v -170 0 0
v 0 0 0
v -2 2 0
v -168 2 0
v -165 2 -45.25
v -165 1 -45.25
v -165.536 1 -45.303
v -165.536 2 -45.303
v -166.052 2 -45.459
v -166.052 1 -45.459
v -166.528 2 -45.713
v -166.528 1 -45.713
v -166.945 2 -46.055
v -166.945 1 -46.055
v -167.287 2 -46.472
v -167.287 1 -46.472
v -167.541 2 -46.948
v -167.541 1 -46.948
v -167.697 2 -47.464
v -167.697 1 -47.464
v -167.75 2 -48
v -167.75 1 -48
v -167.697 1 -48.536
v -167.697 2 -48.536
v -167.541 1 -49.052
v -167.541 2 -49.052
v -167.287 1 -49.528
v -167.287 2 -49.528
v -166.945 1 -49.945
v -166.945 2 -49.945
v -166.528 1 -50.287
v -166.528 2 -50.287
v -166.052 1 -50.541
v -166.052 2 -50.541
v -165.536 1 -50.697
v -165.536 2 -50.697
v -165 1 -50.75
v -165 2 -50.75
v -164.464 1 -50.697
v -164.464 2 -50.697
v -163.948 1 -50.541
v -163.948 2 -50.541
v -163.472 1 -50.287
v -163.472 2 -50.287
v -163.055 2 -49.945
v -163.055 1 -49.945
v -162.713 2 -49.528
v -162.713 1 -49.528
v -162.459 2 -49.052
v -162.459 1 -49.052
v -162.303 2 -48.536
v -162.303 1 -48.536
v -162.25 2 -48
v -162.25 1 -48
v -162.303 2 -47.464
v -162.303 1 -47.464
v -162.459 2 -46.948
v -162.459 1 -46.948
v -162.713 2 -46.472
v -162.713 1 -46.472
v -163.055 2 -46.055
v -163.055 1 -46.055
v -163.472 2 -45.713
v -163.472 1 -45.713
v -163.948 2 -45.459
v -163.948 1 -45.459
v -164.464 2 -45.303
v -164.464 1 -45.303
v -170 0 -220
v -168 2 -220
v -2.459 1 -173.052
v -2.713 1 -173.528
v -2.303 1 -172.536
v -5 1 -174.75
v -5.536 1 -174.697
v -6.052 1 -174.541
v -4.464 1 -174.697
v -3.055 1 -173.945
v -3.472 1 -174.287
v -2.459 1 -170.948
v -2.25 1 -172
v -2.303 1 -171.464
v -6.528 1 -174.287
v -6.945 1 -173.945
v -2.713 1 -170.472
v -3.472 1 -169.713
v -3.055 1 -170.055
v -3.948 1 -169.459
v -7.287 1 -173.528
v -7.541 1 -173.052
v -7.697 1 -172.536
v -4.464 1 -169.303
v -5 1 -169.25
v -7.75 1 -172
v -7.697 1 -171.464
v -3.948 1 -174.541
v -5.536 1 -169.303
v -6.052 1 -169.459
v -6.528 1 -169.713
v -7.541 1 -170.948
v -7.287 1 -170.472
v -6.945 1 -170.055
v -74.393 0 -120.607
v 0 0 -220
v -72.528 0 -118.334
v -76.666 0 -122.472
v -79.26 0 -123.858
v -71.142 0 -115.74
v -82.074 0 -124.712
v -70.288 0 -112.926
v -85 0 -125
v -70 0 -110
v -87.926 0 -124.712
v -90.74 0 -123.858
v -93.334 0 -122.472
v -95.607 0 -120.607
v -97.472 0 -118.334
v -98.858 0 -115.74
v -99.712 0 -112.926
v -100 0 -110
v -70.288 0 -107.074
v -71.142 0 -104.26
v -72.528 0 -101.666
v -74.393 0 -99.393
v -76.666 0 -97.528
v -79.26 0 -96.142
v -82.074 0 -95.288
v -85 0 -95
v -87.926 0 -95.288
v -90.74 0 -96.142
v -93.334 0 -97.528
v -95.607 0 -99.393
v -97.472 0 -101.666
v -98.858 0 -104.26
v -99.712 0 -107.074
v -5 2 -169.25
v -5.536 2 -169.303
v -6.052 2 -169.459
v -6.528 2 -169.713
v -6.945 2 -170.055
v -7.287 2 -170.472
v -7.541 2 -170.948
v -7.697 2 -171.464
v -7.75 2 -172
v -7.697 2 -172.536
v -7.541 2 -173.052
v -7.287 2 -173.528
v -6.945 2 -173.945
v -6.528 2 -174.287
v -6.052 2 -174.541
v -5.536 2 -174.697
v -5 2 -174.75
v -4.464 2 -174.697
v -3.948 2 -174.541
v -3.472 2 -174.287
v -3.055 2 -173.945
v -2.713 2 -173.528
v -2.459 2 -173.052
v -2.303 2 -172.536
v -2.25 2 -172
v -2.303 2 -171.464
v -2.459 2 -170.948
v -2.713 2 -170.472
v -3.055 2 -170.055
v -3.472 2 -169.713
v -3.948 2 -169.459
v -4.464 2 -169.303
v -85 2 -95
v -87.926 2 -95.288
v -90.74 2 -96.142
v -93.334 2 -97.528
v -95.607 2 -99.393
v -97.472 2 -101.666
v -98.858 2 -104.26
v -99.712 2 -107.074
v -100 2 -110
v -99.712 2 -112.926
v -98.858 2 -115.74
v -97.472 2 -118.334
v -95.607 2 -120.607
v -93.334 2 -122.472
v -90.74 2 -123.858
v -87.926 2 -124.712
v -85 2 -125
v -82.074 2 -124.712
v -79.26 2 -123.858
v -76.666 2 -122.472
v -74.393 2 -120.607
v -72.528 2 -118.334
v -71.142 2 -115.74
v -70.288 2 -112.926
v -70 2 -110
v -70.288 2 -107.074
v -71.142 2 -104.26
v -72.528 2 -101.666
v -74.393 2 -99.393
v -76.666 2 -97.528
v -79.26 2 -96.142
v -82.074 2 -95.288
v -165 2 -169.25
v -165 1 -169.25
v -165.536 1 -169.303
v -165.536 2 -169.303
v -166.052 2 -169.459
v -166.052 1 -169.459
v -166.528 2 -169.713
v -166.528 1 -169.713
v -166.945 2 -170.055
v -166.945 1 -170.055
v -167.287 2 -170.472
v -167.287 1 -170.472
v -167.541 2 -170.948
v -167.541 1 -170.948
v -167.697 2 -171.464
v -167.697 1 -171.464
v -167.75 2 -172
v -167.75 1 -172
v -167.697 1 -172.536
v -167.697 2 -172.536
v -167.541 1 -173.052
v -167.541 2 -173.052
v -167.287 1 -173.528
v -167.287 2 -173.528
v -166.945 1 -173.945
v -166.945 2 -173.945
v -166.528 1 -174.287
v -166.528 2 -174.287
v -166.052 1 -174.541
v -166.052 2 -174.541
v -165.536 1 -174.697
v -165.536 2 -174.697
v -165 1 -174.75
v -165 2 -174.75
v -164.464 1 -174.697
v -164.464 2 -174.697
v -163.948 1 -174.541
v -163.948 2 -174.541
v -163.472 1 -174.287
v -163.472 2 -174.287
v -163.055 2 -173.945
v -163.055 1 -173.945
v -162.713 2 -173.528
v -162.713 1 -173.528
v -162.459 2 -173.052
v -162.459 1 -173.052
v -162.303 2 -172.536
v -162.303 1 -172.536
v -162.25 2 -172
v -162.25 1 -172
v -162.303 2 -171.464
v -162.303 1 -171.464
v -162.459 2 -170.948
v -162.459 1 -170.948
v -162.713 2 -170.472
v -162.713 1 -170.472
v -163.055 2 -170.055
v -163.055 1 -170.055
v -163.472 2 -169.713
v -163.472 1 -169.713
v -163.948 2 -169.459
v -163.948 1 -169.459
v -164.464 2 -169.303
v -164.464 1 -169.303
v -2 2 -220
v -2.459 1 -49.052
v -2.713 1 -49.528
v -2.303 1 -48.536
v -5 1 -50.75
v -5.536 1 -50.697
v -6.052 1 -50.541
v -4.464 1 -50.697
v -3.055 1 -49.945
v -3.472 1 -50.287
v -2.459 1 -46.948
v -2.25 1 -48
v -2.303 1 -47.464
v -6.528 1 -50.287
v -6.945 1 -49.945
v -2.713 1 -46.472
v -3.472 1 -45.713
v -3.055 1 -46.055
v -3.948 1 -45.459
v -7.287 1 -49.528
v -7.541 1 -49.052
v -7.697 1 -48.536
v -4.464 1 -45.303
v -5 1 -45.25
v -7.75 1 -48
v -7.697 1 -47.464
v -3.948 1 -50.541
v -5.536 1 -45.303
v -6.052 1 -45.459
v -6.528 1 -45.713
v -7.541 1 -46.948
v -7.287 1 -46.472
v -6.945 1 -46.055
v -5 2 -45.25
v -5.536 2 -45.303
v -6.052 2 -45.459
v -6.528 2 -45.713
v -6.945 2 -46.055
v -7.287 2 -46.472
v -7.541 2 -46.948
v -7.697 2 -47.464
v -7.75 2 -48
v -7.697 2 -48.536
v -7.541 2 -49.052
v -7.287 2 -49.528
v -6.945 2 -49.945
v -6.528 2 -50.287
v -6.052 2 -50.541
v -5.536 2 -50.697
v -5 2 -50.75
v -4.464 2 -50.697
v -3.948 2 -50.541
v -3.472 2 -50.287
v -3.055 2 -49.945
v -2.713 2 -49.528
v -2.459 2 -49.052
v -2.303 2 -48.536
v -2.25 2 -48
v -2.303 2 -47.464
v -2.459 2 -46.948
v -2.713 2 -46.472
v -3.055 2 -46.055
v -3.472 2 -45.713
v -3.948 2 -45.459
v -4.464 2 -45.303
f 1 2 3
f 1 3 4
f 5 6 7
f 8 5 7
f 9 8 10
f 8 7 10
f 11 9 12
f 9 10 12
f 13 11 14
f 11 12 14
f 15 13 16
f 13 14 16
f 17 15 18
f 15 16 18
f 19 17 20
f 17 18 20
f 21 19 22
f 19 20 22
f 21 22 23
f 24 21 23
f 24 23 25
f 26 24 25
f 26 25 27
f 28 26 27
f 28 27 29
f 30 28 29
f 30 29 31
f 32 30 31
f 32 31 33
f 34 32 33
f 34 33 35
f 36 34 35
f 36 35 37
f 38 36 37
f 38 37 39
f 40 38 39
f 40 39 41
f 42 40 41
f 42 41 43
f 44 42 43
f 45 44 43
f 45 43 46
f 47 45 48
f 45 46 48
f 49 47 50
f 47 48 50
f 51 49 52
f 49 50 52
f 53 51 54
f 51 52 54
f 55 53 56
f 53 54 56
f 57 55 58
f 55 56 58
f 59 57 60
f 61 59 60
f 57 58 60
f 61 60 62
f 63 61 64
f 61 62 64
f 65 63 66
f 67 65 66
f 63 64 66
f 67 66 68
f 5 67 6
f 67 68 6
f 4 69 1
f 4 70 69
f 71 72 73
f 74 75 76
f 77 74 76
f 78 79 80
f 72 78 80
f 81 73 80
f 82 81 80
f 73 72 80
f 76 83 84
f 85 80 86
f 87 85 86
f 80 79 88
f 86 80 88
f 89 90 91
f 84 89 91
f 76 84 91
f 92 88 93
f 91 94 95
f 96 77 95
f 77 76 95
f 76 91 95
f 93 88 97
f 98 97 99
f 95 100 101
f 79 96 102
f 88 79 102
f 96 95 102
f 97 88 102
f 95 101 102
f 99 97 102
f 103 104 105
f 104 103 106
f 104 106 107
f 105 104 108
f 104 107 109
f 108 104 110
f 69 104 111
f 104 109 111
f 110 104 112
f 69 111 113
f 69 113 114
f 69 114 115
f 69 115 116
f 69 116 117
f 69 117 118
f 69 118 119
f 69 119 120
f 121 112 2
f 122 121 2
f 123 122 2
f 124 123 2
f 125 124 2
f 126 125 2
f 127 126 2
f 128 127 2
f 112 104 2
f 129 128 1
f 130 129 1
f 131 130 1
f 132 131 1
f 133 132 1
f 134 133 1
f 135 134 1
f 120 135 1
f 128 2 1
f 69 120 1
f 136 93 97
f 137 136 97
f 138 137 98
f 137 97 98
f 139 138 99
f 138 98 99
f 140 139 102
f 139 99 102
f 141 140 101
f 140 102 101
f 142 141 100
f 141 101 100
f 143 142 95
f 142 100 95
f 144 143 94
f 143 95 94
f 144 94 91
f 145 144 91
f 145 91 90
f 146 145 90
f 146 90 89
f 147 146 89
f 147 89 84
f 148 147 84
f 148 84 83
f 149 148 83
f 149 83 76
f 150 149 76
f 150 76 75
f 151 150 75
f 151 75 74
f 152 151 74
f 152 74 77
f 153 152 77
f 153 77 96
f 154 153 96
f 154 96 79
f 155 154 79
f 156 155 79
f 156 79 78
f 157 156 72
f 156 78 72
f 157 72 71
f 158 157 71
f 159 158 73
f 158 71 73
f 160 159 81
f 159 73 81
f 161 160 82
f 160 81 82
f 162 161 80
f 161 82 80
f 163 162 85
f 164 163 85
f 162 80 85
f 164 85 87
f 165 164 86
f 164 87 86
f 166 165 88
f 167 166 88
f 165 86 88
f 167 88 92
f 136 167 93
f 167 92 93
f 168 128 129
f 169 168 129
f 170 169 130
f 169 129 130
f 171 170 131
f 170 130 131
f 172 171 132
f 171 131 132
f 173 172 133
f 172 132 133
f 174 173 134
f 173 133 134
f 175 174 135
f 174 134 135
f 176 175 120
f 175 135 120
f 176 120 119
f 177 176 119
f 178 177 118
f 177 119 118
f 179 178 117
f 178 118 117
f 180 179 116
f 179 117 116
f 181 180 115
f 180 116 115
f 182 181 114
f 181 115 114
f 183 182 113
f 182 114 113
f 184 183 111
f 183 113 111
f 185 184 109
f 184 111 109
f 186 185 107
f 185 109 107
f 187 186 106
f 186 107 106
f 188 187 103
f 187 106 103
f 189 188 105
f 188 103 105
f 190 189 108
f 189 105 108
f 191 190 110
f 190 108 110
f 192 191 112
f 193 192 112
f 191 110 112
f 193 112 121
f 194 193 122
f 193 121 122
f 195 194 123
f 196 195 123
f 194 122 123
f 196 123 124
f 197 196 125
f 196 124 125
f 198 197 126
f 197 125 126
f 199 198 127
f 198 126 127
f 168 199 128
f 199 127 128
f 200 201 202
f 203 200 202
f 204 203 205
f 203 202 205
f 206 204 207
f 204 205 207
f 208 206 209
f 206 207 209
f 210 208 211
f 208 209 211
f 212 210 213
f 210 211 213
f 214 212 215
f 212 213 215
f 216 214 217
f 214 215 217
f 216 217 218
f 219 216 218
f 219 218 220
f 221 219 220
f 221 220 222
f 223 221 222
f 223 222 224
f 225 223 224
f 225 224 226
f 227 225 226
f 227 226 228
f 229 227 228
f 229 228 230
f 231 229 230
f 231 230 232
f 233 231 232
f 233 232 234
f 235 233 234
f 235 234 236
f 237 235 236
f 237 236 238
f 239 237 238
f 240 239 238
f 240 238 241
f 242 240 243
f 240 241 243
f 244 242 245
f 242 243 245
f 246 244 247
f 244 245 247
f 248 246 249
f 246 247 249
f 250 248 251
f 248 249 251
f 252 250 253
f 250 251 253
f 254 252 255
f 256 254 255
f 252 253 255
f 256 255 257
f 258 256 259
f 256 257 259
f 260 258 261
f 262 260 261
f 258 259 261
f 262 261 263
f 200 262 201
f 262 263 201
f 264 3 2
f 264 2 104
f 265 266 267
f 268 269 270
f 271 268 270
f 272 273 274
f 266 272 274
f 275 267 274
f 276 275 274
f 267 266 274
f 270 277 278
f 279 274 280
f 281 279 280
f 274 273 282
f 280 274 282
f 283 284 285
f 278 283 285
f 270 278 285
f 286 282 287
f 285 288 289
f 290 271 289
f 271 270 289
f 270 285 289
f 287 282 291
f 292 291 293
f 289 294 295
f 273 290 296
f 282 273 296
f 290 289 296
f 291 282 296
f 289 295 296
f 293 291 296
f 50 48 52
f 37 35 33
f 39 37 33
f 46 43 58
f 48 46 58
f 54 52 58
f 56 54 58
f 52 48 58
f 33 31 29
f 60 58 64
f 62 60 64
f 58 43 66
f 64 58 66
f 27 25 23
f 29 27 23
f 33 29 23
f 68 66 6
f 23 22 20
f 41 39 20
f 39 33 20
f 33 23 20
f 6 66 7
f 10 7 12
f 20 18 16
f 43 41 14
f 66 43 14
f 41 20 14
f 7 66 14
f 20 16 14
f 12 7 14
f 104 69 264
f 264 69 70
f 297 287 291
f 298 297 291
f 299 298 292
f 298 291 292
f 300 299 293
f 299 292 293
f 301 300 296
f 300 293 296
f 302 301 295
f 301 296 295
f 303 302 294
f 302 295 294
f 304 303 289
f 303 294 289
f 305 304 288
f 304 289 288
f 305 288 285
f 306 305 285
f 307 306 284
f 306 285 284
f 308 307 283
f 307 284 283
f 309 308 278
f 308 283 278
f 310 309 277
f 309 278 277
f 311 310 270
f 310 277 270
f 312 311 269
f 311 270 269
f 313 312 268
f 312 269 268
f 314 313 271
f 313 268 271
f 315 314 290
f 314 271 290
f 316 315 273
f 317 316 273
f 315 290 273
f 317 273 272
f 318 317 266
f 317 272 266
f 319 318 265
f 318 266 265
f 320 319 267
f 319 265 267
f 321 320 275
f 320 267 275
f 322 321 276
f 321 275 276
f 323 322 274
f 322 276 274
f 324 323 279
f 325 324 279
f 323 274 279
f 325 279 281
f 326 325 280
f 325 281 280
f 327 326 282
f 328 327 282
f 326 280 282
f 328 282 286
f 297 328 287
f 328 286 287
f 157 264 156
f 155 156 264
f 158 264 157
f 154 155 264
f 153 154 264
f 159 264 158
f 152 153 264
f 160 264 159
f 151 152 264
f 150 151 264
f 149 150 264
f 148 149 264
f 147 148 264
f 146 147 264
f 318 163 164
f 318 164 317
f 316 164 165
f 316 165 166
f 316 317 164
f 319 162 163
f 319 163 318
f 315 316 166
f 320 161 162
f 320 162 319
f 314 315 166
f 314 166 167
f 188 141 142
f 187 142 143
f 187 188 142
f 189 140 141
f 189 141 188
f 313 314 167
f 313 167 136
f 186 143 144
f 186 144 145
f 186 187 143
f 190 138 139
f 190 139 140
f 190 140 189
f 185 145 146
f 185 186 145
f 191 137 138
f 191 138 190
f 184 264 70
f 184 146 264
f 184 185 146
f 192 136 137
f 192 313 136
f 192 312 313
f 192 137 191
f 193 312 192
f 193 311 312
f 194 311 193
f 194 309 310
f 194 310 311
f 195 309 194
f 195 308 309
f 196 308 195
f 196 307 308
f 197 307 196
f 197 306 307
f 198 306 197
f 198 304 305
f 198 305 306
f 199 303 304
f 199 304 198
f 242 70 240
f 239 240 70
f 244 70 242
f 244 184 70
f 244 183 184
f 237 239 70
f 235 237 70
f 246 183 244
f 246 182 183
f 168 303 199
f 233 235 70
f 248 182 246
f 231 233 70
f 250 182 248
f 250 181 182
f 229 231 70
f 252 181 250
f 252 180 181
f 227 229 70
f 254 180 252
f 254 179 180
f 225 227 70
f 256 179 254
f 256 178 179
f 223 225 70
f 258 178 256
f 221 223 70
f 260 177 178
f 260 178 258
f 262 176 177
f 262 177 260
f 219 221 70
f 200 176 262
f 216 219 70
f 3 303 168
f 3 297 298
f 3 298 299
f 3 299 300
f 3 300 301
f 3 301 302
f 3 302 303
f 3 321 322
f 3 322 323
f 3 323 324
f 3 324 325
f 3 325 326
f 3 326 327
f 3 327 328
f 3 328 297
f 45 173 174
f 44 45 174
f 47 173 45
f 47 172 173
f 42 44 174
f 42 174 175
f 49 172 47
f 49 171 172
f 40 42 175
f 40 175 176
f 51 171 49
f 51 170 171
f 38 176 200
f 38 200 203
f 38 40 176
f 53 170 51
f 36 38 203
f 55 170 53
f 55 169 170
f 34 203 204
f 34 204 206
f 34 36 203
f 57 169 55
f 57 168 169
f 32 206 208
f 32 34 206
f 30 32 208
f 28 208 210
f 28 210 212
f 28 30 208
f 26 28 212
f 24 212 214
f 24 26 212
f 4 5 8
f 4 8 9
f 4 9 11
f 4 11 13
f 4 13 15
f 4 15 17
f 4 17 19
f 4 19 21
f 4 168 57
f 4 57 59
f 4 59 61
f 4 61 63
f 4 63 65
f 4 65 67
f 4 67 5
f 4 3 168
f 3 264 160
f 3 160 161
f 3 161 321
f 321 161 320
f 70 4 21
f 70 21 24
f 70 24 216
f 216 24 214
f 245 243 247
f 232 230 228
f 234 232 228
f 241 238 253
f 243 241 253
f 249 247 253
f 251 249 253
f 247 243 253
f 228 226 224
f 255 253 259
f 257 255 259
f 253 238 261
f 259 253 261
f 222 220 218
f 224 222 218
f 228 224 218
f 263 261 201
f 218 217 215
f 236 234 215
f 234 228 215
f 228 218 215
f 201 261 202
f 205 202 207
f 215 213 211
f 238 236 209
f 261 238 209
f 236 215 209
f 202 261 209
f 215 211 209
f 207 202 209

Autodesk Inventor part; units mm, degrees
ref_plane "YZ Plane" through (0, 0, 0) normal (1, 0, 0) x (0, 1, 0)
ref_plane "XZ Plane" through (0, 0, 0) normal (0, 1, 0) x (-1, 0, 0)
ref_plane "XY Plane" through (0, 0, 0) normal (0, 0, 1) x (1, 0, 0)
sketch "Sketch1" plane through (0, 0, 0) normal (0, 1, 0) x (-1, 0, 0)
  line L0 (0, 0) -> (170, 0)
  line L1 (170, 0) -> (170, -220)
  line L2 (170, -220) -> (0, -220)
  line L3 (0, -220) -> (0, 0)
  dimension "d0" = 170
  dimension "d1" = 220
extrude "base" add sketch "Sketch1" along normal blind 2
chamfer "chamfers" distance 2 angle 45 2 edges at (-170, 2, -110) (0, 2, -110)
sketch "holes" plane through (0, 2, 0) normal (0, 1, 0) x (1, 0, 0)
  line L0 (-170, 220) -> (-170, 0) projected
  line L1 (0, 220) -> (-170, 220) projected
  line L2 (-170, 0) -> (0, 0)
  line L3 (0, 0) -> (0, 220)
  line L4 (0, 220) -> (-170, 220)
  line L5 (-170, 220) -> (-170, 0)
  line L6 (-168, 45) -> (-2, 45)
  line L7 (-2, 45) -> (-2, 175)
  line L8 (-2, 175) -> (-168, 175)
  line L9 (-168, 175) -> (-168, 45)
  line L10 (-2, 45) -> (-8, 45)
  line L11 (-8, 45) -> (-8, 51)
  line L12 (-8, 51) -> (-2, 51)
  line L13 (-2, 51) -> (-2, 45)
  line L14 (-2, 175) -> (-8, 175)
  line L15 (-8, 175) -> (-8, 169)
  line L16 (-8, 169) -> (-2, 169)
  line L17 (-2, 169) -> (-2, 175)
  line L18 (-168, 45) -> (-162, 45)
  line L19 (-162, 45) -> (-162, 51)
  line L20 (-162, 51) -> (-168, 51)
  line L21 (-168, 51) -> (-168, 45)
  line L22 (-168, 175) -> (-162, 175)
  line L23 (-162, 175) -> (-162, 169)
  line L24 (-162, 169) -> (-168, 169)
  line L25 (-168, 169) -> (-168, 175)
  point P0 (-85, 175)
  point P1 (-85, 220)
  point P2 (-168, 110)
  point P3 (-170, 110)
  point P4 (-165, 48)
  point P5 (-165, 172)
  point P6 (-5, 172)
  point P7 (-5, 48)
  point P8 (-85, 110)
  dimension "d10" = 166
  dimension "d11" = 130
  dimension "d12" = 6
  dimension "d13" = 6
  dimension "d14" = 6
  dimension "d15" = 6
  dimension "d16" = 6
  dimension "d17" = 6
  dimension "d18" = 6
hole "magnet_holders" at (-165, 2, -48) at (-165, 2, -172) at (-5, 2, -172) at (-5, 2, -48) direction (0, -1, 0) diameter 5.5 depth 1
hole "wire_hole" at (-85, 2, -110) direction (0, -1, 0) diameter 30 end through all
properties part number "lid"
